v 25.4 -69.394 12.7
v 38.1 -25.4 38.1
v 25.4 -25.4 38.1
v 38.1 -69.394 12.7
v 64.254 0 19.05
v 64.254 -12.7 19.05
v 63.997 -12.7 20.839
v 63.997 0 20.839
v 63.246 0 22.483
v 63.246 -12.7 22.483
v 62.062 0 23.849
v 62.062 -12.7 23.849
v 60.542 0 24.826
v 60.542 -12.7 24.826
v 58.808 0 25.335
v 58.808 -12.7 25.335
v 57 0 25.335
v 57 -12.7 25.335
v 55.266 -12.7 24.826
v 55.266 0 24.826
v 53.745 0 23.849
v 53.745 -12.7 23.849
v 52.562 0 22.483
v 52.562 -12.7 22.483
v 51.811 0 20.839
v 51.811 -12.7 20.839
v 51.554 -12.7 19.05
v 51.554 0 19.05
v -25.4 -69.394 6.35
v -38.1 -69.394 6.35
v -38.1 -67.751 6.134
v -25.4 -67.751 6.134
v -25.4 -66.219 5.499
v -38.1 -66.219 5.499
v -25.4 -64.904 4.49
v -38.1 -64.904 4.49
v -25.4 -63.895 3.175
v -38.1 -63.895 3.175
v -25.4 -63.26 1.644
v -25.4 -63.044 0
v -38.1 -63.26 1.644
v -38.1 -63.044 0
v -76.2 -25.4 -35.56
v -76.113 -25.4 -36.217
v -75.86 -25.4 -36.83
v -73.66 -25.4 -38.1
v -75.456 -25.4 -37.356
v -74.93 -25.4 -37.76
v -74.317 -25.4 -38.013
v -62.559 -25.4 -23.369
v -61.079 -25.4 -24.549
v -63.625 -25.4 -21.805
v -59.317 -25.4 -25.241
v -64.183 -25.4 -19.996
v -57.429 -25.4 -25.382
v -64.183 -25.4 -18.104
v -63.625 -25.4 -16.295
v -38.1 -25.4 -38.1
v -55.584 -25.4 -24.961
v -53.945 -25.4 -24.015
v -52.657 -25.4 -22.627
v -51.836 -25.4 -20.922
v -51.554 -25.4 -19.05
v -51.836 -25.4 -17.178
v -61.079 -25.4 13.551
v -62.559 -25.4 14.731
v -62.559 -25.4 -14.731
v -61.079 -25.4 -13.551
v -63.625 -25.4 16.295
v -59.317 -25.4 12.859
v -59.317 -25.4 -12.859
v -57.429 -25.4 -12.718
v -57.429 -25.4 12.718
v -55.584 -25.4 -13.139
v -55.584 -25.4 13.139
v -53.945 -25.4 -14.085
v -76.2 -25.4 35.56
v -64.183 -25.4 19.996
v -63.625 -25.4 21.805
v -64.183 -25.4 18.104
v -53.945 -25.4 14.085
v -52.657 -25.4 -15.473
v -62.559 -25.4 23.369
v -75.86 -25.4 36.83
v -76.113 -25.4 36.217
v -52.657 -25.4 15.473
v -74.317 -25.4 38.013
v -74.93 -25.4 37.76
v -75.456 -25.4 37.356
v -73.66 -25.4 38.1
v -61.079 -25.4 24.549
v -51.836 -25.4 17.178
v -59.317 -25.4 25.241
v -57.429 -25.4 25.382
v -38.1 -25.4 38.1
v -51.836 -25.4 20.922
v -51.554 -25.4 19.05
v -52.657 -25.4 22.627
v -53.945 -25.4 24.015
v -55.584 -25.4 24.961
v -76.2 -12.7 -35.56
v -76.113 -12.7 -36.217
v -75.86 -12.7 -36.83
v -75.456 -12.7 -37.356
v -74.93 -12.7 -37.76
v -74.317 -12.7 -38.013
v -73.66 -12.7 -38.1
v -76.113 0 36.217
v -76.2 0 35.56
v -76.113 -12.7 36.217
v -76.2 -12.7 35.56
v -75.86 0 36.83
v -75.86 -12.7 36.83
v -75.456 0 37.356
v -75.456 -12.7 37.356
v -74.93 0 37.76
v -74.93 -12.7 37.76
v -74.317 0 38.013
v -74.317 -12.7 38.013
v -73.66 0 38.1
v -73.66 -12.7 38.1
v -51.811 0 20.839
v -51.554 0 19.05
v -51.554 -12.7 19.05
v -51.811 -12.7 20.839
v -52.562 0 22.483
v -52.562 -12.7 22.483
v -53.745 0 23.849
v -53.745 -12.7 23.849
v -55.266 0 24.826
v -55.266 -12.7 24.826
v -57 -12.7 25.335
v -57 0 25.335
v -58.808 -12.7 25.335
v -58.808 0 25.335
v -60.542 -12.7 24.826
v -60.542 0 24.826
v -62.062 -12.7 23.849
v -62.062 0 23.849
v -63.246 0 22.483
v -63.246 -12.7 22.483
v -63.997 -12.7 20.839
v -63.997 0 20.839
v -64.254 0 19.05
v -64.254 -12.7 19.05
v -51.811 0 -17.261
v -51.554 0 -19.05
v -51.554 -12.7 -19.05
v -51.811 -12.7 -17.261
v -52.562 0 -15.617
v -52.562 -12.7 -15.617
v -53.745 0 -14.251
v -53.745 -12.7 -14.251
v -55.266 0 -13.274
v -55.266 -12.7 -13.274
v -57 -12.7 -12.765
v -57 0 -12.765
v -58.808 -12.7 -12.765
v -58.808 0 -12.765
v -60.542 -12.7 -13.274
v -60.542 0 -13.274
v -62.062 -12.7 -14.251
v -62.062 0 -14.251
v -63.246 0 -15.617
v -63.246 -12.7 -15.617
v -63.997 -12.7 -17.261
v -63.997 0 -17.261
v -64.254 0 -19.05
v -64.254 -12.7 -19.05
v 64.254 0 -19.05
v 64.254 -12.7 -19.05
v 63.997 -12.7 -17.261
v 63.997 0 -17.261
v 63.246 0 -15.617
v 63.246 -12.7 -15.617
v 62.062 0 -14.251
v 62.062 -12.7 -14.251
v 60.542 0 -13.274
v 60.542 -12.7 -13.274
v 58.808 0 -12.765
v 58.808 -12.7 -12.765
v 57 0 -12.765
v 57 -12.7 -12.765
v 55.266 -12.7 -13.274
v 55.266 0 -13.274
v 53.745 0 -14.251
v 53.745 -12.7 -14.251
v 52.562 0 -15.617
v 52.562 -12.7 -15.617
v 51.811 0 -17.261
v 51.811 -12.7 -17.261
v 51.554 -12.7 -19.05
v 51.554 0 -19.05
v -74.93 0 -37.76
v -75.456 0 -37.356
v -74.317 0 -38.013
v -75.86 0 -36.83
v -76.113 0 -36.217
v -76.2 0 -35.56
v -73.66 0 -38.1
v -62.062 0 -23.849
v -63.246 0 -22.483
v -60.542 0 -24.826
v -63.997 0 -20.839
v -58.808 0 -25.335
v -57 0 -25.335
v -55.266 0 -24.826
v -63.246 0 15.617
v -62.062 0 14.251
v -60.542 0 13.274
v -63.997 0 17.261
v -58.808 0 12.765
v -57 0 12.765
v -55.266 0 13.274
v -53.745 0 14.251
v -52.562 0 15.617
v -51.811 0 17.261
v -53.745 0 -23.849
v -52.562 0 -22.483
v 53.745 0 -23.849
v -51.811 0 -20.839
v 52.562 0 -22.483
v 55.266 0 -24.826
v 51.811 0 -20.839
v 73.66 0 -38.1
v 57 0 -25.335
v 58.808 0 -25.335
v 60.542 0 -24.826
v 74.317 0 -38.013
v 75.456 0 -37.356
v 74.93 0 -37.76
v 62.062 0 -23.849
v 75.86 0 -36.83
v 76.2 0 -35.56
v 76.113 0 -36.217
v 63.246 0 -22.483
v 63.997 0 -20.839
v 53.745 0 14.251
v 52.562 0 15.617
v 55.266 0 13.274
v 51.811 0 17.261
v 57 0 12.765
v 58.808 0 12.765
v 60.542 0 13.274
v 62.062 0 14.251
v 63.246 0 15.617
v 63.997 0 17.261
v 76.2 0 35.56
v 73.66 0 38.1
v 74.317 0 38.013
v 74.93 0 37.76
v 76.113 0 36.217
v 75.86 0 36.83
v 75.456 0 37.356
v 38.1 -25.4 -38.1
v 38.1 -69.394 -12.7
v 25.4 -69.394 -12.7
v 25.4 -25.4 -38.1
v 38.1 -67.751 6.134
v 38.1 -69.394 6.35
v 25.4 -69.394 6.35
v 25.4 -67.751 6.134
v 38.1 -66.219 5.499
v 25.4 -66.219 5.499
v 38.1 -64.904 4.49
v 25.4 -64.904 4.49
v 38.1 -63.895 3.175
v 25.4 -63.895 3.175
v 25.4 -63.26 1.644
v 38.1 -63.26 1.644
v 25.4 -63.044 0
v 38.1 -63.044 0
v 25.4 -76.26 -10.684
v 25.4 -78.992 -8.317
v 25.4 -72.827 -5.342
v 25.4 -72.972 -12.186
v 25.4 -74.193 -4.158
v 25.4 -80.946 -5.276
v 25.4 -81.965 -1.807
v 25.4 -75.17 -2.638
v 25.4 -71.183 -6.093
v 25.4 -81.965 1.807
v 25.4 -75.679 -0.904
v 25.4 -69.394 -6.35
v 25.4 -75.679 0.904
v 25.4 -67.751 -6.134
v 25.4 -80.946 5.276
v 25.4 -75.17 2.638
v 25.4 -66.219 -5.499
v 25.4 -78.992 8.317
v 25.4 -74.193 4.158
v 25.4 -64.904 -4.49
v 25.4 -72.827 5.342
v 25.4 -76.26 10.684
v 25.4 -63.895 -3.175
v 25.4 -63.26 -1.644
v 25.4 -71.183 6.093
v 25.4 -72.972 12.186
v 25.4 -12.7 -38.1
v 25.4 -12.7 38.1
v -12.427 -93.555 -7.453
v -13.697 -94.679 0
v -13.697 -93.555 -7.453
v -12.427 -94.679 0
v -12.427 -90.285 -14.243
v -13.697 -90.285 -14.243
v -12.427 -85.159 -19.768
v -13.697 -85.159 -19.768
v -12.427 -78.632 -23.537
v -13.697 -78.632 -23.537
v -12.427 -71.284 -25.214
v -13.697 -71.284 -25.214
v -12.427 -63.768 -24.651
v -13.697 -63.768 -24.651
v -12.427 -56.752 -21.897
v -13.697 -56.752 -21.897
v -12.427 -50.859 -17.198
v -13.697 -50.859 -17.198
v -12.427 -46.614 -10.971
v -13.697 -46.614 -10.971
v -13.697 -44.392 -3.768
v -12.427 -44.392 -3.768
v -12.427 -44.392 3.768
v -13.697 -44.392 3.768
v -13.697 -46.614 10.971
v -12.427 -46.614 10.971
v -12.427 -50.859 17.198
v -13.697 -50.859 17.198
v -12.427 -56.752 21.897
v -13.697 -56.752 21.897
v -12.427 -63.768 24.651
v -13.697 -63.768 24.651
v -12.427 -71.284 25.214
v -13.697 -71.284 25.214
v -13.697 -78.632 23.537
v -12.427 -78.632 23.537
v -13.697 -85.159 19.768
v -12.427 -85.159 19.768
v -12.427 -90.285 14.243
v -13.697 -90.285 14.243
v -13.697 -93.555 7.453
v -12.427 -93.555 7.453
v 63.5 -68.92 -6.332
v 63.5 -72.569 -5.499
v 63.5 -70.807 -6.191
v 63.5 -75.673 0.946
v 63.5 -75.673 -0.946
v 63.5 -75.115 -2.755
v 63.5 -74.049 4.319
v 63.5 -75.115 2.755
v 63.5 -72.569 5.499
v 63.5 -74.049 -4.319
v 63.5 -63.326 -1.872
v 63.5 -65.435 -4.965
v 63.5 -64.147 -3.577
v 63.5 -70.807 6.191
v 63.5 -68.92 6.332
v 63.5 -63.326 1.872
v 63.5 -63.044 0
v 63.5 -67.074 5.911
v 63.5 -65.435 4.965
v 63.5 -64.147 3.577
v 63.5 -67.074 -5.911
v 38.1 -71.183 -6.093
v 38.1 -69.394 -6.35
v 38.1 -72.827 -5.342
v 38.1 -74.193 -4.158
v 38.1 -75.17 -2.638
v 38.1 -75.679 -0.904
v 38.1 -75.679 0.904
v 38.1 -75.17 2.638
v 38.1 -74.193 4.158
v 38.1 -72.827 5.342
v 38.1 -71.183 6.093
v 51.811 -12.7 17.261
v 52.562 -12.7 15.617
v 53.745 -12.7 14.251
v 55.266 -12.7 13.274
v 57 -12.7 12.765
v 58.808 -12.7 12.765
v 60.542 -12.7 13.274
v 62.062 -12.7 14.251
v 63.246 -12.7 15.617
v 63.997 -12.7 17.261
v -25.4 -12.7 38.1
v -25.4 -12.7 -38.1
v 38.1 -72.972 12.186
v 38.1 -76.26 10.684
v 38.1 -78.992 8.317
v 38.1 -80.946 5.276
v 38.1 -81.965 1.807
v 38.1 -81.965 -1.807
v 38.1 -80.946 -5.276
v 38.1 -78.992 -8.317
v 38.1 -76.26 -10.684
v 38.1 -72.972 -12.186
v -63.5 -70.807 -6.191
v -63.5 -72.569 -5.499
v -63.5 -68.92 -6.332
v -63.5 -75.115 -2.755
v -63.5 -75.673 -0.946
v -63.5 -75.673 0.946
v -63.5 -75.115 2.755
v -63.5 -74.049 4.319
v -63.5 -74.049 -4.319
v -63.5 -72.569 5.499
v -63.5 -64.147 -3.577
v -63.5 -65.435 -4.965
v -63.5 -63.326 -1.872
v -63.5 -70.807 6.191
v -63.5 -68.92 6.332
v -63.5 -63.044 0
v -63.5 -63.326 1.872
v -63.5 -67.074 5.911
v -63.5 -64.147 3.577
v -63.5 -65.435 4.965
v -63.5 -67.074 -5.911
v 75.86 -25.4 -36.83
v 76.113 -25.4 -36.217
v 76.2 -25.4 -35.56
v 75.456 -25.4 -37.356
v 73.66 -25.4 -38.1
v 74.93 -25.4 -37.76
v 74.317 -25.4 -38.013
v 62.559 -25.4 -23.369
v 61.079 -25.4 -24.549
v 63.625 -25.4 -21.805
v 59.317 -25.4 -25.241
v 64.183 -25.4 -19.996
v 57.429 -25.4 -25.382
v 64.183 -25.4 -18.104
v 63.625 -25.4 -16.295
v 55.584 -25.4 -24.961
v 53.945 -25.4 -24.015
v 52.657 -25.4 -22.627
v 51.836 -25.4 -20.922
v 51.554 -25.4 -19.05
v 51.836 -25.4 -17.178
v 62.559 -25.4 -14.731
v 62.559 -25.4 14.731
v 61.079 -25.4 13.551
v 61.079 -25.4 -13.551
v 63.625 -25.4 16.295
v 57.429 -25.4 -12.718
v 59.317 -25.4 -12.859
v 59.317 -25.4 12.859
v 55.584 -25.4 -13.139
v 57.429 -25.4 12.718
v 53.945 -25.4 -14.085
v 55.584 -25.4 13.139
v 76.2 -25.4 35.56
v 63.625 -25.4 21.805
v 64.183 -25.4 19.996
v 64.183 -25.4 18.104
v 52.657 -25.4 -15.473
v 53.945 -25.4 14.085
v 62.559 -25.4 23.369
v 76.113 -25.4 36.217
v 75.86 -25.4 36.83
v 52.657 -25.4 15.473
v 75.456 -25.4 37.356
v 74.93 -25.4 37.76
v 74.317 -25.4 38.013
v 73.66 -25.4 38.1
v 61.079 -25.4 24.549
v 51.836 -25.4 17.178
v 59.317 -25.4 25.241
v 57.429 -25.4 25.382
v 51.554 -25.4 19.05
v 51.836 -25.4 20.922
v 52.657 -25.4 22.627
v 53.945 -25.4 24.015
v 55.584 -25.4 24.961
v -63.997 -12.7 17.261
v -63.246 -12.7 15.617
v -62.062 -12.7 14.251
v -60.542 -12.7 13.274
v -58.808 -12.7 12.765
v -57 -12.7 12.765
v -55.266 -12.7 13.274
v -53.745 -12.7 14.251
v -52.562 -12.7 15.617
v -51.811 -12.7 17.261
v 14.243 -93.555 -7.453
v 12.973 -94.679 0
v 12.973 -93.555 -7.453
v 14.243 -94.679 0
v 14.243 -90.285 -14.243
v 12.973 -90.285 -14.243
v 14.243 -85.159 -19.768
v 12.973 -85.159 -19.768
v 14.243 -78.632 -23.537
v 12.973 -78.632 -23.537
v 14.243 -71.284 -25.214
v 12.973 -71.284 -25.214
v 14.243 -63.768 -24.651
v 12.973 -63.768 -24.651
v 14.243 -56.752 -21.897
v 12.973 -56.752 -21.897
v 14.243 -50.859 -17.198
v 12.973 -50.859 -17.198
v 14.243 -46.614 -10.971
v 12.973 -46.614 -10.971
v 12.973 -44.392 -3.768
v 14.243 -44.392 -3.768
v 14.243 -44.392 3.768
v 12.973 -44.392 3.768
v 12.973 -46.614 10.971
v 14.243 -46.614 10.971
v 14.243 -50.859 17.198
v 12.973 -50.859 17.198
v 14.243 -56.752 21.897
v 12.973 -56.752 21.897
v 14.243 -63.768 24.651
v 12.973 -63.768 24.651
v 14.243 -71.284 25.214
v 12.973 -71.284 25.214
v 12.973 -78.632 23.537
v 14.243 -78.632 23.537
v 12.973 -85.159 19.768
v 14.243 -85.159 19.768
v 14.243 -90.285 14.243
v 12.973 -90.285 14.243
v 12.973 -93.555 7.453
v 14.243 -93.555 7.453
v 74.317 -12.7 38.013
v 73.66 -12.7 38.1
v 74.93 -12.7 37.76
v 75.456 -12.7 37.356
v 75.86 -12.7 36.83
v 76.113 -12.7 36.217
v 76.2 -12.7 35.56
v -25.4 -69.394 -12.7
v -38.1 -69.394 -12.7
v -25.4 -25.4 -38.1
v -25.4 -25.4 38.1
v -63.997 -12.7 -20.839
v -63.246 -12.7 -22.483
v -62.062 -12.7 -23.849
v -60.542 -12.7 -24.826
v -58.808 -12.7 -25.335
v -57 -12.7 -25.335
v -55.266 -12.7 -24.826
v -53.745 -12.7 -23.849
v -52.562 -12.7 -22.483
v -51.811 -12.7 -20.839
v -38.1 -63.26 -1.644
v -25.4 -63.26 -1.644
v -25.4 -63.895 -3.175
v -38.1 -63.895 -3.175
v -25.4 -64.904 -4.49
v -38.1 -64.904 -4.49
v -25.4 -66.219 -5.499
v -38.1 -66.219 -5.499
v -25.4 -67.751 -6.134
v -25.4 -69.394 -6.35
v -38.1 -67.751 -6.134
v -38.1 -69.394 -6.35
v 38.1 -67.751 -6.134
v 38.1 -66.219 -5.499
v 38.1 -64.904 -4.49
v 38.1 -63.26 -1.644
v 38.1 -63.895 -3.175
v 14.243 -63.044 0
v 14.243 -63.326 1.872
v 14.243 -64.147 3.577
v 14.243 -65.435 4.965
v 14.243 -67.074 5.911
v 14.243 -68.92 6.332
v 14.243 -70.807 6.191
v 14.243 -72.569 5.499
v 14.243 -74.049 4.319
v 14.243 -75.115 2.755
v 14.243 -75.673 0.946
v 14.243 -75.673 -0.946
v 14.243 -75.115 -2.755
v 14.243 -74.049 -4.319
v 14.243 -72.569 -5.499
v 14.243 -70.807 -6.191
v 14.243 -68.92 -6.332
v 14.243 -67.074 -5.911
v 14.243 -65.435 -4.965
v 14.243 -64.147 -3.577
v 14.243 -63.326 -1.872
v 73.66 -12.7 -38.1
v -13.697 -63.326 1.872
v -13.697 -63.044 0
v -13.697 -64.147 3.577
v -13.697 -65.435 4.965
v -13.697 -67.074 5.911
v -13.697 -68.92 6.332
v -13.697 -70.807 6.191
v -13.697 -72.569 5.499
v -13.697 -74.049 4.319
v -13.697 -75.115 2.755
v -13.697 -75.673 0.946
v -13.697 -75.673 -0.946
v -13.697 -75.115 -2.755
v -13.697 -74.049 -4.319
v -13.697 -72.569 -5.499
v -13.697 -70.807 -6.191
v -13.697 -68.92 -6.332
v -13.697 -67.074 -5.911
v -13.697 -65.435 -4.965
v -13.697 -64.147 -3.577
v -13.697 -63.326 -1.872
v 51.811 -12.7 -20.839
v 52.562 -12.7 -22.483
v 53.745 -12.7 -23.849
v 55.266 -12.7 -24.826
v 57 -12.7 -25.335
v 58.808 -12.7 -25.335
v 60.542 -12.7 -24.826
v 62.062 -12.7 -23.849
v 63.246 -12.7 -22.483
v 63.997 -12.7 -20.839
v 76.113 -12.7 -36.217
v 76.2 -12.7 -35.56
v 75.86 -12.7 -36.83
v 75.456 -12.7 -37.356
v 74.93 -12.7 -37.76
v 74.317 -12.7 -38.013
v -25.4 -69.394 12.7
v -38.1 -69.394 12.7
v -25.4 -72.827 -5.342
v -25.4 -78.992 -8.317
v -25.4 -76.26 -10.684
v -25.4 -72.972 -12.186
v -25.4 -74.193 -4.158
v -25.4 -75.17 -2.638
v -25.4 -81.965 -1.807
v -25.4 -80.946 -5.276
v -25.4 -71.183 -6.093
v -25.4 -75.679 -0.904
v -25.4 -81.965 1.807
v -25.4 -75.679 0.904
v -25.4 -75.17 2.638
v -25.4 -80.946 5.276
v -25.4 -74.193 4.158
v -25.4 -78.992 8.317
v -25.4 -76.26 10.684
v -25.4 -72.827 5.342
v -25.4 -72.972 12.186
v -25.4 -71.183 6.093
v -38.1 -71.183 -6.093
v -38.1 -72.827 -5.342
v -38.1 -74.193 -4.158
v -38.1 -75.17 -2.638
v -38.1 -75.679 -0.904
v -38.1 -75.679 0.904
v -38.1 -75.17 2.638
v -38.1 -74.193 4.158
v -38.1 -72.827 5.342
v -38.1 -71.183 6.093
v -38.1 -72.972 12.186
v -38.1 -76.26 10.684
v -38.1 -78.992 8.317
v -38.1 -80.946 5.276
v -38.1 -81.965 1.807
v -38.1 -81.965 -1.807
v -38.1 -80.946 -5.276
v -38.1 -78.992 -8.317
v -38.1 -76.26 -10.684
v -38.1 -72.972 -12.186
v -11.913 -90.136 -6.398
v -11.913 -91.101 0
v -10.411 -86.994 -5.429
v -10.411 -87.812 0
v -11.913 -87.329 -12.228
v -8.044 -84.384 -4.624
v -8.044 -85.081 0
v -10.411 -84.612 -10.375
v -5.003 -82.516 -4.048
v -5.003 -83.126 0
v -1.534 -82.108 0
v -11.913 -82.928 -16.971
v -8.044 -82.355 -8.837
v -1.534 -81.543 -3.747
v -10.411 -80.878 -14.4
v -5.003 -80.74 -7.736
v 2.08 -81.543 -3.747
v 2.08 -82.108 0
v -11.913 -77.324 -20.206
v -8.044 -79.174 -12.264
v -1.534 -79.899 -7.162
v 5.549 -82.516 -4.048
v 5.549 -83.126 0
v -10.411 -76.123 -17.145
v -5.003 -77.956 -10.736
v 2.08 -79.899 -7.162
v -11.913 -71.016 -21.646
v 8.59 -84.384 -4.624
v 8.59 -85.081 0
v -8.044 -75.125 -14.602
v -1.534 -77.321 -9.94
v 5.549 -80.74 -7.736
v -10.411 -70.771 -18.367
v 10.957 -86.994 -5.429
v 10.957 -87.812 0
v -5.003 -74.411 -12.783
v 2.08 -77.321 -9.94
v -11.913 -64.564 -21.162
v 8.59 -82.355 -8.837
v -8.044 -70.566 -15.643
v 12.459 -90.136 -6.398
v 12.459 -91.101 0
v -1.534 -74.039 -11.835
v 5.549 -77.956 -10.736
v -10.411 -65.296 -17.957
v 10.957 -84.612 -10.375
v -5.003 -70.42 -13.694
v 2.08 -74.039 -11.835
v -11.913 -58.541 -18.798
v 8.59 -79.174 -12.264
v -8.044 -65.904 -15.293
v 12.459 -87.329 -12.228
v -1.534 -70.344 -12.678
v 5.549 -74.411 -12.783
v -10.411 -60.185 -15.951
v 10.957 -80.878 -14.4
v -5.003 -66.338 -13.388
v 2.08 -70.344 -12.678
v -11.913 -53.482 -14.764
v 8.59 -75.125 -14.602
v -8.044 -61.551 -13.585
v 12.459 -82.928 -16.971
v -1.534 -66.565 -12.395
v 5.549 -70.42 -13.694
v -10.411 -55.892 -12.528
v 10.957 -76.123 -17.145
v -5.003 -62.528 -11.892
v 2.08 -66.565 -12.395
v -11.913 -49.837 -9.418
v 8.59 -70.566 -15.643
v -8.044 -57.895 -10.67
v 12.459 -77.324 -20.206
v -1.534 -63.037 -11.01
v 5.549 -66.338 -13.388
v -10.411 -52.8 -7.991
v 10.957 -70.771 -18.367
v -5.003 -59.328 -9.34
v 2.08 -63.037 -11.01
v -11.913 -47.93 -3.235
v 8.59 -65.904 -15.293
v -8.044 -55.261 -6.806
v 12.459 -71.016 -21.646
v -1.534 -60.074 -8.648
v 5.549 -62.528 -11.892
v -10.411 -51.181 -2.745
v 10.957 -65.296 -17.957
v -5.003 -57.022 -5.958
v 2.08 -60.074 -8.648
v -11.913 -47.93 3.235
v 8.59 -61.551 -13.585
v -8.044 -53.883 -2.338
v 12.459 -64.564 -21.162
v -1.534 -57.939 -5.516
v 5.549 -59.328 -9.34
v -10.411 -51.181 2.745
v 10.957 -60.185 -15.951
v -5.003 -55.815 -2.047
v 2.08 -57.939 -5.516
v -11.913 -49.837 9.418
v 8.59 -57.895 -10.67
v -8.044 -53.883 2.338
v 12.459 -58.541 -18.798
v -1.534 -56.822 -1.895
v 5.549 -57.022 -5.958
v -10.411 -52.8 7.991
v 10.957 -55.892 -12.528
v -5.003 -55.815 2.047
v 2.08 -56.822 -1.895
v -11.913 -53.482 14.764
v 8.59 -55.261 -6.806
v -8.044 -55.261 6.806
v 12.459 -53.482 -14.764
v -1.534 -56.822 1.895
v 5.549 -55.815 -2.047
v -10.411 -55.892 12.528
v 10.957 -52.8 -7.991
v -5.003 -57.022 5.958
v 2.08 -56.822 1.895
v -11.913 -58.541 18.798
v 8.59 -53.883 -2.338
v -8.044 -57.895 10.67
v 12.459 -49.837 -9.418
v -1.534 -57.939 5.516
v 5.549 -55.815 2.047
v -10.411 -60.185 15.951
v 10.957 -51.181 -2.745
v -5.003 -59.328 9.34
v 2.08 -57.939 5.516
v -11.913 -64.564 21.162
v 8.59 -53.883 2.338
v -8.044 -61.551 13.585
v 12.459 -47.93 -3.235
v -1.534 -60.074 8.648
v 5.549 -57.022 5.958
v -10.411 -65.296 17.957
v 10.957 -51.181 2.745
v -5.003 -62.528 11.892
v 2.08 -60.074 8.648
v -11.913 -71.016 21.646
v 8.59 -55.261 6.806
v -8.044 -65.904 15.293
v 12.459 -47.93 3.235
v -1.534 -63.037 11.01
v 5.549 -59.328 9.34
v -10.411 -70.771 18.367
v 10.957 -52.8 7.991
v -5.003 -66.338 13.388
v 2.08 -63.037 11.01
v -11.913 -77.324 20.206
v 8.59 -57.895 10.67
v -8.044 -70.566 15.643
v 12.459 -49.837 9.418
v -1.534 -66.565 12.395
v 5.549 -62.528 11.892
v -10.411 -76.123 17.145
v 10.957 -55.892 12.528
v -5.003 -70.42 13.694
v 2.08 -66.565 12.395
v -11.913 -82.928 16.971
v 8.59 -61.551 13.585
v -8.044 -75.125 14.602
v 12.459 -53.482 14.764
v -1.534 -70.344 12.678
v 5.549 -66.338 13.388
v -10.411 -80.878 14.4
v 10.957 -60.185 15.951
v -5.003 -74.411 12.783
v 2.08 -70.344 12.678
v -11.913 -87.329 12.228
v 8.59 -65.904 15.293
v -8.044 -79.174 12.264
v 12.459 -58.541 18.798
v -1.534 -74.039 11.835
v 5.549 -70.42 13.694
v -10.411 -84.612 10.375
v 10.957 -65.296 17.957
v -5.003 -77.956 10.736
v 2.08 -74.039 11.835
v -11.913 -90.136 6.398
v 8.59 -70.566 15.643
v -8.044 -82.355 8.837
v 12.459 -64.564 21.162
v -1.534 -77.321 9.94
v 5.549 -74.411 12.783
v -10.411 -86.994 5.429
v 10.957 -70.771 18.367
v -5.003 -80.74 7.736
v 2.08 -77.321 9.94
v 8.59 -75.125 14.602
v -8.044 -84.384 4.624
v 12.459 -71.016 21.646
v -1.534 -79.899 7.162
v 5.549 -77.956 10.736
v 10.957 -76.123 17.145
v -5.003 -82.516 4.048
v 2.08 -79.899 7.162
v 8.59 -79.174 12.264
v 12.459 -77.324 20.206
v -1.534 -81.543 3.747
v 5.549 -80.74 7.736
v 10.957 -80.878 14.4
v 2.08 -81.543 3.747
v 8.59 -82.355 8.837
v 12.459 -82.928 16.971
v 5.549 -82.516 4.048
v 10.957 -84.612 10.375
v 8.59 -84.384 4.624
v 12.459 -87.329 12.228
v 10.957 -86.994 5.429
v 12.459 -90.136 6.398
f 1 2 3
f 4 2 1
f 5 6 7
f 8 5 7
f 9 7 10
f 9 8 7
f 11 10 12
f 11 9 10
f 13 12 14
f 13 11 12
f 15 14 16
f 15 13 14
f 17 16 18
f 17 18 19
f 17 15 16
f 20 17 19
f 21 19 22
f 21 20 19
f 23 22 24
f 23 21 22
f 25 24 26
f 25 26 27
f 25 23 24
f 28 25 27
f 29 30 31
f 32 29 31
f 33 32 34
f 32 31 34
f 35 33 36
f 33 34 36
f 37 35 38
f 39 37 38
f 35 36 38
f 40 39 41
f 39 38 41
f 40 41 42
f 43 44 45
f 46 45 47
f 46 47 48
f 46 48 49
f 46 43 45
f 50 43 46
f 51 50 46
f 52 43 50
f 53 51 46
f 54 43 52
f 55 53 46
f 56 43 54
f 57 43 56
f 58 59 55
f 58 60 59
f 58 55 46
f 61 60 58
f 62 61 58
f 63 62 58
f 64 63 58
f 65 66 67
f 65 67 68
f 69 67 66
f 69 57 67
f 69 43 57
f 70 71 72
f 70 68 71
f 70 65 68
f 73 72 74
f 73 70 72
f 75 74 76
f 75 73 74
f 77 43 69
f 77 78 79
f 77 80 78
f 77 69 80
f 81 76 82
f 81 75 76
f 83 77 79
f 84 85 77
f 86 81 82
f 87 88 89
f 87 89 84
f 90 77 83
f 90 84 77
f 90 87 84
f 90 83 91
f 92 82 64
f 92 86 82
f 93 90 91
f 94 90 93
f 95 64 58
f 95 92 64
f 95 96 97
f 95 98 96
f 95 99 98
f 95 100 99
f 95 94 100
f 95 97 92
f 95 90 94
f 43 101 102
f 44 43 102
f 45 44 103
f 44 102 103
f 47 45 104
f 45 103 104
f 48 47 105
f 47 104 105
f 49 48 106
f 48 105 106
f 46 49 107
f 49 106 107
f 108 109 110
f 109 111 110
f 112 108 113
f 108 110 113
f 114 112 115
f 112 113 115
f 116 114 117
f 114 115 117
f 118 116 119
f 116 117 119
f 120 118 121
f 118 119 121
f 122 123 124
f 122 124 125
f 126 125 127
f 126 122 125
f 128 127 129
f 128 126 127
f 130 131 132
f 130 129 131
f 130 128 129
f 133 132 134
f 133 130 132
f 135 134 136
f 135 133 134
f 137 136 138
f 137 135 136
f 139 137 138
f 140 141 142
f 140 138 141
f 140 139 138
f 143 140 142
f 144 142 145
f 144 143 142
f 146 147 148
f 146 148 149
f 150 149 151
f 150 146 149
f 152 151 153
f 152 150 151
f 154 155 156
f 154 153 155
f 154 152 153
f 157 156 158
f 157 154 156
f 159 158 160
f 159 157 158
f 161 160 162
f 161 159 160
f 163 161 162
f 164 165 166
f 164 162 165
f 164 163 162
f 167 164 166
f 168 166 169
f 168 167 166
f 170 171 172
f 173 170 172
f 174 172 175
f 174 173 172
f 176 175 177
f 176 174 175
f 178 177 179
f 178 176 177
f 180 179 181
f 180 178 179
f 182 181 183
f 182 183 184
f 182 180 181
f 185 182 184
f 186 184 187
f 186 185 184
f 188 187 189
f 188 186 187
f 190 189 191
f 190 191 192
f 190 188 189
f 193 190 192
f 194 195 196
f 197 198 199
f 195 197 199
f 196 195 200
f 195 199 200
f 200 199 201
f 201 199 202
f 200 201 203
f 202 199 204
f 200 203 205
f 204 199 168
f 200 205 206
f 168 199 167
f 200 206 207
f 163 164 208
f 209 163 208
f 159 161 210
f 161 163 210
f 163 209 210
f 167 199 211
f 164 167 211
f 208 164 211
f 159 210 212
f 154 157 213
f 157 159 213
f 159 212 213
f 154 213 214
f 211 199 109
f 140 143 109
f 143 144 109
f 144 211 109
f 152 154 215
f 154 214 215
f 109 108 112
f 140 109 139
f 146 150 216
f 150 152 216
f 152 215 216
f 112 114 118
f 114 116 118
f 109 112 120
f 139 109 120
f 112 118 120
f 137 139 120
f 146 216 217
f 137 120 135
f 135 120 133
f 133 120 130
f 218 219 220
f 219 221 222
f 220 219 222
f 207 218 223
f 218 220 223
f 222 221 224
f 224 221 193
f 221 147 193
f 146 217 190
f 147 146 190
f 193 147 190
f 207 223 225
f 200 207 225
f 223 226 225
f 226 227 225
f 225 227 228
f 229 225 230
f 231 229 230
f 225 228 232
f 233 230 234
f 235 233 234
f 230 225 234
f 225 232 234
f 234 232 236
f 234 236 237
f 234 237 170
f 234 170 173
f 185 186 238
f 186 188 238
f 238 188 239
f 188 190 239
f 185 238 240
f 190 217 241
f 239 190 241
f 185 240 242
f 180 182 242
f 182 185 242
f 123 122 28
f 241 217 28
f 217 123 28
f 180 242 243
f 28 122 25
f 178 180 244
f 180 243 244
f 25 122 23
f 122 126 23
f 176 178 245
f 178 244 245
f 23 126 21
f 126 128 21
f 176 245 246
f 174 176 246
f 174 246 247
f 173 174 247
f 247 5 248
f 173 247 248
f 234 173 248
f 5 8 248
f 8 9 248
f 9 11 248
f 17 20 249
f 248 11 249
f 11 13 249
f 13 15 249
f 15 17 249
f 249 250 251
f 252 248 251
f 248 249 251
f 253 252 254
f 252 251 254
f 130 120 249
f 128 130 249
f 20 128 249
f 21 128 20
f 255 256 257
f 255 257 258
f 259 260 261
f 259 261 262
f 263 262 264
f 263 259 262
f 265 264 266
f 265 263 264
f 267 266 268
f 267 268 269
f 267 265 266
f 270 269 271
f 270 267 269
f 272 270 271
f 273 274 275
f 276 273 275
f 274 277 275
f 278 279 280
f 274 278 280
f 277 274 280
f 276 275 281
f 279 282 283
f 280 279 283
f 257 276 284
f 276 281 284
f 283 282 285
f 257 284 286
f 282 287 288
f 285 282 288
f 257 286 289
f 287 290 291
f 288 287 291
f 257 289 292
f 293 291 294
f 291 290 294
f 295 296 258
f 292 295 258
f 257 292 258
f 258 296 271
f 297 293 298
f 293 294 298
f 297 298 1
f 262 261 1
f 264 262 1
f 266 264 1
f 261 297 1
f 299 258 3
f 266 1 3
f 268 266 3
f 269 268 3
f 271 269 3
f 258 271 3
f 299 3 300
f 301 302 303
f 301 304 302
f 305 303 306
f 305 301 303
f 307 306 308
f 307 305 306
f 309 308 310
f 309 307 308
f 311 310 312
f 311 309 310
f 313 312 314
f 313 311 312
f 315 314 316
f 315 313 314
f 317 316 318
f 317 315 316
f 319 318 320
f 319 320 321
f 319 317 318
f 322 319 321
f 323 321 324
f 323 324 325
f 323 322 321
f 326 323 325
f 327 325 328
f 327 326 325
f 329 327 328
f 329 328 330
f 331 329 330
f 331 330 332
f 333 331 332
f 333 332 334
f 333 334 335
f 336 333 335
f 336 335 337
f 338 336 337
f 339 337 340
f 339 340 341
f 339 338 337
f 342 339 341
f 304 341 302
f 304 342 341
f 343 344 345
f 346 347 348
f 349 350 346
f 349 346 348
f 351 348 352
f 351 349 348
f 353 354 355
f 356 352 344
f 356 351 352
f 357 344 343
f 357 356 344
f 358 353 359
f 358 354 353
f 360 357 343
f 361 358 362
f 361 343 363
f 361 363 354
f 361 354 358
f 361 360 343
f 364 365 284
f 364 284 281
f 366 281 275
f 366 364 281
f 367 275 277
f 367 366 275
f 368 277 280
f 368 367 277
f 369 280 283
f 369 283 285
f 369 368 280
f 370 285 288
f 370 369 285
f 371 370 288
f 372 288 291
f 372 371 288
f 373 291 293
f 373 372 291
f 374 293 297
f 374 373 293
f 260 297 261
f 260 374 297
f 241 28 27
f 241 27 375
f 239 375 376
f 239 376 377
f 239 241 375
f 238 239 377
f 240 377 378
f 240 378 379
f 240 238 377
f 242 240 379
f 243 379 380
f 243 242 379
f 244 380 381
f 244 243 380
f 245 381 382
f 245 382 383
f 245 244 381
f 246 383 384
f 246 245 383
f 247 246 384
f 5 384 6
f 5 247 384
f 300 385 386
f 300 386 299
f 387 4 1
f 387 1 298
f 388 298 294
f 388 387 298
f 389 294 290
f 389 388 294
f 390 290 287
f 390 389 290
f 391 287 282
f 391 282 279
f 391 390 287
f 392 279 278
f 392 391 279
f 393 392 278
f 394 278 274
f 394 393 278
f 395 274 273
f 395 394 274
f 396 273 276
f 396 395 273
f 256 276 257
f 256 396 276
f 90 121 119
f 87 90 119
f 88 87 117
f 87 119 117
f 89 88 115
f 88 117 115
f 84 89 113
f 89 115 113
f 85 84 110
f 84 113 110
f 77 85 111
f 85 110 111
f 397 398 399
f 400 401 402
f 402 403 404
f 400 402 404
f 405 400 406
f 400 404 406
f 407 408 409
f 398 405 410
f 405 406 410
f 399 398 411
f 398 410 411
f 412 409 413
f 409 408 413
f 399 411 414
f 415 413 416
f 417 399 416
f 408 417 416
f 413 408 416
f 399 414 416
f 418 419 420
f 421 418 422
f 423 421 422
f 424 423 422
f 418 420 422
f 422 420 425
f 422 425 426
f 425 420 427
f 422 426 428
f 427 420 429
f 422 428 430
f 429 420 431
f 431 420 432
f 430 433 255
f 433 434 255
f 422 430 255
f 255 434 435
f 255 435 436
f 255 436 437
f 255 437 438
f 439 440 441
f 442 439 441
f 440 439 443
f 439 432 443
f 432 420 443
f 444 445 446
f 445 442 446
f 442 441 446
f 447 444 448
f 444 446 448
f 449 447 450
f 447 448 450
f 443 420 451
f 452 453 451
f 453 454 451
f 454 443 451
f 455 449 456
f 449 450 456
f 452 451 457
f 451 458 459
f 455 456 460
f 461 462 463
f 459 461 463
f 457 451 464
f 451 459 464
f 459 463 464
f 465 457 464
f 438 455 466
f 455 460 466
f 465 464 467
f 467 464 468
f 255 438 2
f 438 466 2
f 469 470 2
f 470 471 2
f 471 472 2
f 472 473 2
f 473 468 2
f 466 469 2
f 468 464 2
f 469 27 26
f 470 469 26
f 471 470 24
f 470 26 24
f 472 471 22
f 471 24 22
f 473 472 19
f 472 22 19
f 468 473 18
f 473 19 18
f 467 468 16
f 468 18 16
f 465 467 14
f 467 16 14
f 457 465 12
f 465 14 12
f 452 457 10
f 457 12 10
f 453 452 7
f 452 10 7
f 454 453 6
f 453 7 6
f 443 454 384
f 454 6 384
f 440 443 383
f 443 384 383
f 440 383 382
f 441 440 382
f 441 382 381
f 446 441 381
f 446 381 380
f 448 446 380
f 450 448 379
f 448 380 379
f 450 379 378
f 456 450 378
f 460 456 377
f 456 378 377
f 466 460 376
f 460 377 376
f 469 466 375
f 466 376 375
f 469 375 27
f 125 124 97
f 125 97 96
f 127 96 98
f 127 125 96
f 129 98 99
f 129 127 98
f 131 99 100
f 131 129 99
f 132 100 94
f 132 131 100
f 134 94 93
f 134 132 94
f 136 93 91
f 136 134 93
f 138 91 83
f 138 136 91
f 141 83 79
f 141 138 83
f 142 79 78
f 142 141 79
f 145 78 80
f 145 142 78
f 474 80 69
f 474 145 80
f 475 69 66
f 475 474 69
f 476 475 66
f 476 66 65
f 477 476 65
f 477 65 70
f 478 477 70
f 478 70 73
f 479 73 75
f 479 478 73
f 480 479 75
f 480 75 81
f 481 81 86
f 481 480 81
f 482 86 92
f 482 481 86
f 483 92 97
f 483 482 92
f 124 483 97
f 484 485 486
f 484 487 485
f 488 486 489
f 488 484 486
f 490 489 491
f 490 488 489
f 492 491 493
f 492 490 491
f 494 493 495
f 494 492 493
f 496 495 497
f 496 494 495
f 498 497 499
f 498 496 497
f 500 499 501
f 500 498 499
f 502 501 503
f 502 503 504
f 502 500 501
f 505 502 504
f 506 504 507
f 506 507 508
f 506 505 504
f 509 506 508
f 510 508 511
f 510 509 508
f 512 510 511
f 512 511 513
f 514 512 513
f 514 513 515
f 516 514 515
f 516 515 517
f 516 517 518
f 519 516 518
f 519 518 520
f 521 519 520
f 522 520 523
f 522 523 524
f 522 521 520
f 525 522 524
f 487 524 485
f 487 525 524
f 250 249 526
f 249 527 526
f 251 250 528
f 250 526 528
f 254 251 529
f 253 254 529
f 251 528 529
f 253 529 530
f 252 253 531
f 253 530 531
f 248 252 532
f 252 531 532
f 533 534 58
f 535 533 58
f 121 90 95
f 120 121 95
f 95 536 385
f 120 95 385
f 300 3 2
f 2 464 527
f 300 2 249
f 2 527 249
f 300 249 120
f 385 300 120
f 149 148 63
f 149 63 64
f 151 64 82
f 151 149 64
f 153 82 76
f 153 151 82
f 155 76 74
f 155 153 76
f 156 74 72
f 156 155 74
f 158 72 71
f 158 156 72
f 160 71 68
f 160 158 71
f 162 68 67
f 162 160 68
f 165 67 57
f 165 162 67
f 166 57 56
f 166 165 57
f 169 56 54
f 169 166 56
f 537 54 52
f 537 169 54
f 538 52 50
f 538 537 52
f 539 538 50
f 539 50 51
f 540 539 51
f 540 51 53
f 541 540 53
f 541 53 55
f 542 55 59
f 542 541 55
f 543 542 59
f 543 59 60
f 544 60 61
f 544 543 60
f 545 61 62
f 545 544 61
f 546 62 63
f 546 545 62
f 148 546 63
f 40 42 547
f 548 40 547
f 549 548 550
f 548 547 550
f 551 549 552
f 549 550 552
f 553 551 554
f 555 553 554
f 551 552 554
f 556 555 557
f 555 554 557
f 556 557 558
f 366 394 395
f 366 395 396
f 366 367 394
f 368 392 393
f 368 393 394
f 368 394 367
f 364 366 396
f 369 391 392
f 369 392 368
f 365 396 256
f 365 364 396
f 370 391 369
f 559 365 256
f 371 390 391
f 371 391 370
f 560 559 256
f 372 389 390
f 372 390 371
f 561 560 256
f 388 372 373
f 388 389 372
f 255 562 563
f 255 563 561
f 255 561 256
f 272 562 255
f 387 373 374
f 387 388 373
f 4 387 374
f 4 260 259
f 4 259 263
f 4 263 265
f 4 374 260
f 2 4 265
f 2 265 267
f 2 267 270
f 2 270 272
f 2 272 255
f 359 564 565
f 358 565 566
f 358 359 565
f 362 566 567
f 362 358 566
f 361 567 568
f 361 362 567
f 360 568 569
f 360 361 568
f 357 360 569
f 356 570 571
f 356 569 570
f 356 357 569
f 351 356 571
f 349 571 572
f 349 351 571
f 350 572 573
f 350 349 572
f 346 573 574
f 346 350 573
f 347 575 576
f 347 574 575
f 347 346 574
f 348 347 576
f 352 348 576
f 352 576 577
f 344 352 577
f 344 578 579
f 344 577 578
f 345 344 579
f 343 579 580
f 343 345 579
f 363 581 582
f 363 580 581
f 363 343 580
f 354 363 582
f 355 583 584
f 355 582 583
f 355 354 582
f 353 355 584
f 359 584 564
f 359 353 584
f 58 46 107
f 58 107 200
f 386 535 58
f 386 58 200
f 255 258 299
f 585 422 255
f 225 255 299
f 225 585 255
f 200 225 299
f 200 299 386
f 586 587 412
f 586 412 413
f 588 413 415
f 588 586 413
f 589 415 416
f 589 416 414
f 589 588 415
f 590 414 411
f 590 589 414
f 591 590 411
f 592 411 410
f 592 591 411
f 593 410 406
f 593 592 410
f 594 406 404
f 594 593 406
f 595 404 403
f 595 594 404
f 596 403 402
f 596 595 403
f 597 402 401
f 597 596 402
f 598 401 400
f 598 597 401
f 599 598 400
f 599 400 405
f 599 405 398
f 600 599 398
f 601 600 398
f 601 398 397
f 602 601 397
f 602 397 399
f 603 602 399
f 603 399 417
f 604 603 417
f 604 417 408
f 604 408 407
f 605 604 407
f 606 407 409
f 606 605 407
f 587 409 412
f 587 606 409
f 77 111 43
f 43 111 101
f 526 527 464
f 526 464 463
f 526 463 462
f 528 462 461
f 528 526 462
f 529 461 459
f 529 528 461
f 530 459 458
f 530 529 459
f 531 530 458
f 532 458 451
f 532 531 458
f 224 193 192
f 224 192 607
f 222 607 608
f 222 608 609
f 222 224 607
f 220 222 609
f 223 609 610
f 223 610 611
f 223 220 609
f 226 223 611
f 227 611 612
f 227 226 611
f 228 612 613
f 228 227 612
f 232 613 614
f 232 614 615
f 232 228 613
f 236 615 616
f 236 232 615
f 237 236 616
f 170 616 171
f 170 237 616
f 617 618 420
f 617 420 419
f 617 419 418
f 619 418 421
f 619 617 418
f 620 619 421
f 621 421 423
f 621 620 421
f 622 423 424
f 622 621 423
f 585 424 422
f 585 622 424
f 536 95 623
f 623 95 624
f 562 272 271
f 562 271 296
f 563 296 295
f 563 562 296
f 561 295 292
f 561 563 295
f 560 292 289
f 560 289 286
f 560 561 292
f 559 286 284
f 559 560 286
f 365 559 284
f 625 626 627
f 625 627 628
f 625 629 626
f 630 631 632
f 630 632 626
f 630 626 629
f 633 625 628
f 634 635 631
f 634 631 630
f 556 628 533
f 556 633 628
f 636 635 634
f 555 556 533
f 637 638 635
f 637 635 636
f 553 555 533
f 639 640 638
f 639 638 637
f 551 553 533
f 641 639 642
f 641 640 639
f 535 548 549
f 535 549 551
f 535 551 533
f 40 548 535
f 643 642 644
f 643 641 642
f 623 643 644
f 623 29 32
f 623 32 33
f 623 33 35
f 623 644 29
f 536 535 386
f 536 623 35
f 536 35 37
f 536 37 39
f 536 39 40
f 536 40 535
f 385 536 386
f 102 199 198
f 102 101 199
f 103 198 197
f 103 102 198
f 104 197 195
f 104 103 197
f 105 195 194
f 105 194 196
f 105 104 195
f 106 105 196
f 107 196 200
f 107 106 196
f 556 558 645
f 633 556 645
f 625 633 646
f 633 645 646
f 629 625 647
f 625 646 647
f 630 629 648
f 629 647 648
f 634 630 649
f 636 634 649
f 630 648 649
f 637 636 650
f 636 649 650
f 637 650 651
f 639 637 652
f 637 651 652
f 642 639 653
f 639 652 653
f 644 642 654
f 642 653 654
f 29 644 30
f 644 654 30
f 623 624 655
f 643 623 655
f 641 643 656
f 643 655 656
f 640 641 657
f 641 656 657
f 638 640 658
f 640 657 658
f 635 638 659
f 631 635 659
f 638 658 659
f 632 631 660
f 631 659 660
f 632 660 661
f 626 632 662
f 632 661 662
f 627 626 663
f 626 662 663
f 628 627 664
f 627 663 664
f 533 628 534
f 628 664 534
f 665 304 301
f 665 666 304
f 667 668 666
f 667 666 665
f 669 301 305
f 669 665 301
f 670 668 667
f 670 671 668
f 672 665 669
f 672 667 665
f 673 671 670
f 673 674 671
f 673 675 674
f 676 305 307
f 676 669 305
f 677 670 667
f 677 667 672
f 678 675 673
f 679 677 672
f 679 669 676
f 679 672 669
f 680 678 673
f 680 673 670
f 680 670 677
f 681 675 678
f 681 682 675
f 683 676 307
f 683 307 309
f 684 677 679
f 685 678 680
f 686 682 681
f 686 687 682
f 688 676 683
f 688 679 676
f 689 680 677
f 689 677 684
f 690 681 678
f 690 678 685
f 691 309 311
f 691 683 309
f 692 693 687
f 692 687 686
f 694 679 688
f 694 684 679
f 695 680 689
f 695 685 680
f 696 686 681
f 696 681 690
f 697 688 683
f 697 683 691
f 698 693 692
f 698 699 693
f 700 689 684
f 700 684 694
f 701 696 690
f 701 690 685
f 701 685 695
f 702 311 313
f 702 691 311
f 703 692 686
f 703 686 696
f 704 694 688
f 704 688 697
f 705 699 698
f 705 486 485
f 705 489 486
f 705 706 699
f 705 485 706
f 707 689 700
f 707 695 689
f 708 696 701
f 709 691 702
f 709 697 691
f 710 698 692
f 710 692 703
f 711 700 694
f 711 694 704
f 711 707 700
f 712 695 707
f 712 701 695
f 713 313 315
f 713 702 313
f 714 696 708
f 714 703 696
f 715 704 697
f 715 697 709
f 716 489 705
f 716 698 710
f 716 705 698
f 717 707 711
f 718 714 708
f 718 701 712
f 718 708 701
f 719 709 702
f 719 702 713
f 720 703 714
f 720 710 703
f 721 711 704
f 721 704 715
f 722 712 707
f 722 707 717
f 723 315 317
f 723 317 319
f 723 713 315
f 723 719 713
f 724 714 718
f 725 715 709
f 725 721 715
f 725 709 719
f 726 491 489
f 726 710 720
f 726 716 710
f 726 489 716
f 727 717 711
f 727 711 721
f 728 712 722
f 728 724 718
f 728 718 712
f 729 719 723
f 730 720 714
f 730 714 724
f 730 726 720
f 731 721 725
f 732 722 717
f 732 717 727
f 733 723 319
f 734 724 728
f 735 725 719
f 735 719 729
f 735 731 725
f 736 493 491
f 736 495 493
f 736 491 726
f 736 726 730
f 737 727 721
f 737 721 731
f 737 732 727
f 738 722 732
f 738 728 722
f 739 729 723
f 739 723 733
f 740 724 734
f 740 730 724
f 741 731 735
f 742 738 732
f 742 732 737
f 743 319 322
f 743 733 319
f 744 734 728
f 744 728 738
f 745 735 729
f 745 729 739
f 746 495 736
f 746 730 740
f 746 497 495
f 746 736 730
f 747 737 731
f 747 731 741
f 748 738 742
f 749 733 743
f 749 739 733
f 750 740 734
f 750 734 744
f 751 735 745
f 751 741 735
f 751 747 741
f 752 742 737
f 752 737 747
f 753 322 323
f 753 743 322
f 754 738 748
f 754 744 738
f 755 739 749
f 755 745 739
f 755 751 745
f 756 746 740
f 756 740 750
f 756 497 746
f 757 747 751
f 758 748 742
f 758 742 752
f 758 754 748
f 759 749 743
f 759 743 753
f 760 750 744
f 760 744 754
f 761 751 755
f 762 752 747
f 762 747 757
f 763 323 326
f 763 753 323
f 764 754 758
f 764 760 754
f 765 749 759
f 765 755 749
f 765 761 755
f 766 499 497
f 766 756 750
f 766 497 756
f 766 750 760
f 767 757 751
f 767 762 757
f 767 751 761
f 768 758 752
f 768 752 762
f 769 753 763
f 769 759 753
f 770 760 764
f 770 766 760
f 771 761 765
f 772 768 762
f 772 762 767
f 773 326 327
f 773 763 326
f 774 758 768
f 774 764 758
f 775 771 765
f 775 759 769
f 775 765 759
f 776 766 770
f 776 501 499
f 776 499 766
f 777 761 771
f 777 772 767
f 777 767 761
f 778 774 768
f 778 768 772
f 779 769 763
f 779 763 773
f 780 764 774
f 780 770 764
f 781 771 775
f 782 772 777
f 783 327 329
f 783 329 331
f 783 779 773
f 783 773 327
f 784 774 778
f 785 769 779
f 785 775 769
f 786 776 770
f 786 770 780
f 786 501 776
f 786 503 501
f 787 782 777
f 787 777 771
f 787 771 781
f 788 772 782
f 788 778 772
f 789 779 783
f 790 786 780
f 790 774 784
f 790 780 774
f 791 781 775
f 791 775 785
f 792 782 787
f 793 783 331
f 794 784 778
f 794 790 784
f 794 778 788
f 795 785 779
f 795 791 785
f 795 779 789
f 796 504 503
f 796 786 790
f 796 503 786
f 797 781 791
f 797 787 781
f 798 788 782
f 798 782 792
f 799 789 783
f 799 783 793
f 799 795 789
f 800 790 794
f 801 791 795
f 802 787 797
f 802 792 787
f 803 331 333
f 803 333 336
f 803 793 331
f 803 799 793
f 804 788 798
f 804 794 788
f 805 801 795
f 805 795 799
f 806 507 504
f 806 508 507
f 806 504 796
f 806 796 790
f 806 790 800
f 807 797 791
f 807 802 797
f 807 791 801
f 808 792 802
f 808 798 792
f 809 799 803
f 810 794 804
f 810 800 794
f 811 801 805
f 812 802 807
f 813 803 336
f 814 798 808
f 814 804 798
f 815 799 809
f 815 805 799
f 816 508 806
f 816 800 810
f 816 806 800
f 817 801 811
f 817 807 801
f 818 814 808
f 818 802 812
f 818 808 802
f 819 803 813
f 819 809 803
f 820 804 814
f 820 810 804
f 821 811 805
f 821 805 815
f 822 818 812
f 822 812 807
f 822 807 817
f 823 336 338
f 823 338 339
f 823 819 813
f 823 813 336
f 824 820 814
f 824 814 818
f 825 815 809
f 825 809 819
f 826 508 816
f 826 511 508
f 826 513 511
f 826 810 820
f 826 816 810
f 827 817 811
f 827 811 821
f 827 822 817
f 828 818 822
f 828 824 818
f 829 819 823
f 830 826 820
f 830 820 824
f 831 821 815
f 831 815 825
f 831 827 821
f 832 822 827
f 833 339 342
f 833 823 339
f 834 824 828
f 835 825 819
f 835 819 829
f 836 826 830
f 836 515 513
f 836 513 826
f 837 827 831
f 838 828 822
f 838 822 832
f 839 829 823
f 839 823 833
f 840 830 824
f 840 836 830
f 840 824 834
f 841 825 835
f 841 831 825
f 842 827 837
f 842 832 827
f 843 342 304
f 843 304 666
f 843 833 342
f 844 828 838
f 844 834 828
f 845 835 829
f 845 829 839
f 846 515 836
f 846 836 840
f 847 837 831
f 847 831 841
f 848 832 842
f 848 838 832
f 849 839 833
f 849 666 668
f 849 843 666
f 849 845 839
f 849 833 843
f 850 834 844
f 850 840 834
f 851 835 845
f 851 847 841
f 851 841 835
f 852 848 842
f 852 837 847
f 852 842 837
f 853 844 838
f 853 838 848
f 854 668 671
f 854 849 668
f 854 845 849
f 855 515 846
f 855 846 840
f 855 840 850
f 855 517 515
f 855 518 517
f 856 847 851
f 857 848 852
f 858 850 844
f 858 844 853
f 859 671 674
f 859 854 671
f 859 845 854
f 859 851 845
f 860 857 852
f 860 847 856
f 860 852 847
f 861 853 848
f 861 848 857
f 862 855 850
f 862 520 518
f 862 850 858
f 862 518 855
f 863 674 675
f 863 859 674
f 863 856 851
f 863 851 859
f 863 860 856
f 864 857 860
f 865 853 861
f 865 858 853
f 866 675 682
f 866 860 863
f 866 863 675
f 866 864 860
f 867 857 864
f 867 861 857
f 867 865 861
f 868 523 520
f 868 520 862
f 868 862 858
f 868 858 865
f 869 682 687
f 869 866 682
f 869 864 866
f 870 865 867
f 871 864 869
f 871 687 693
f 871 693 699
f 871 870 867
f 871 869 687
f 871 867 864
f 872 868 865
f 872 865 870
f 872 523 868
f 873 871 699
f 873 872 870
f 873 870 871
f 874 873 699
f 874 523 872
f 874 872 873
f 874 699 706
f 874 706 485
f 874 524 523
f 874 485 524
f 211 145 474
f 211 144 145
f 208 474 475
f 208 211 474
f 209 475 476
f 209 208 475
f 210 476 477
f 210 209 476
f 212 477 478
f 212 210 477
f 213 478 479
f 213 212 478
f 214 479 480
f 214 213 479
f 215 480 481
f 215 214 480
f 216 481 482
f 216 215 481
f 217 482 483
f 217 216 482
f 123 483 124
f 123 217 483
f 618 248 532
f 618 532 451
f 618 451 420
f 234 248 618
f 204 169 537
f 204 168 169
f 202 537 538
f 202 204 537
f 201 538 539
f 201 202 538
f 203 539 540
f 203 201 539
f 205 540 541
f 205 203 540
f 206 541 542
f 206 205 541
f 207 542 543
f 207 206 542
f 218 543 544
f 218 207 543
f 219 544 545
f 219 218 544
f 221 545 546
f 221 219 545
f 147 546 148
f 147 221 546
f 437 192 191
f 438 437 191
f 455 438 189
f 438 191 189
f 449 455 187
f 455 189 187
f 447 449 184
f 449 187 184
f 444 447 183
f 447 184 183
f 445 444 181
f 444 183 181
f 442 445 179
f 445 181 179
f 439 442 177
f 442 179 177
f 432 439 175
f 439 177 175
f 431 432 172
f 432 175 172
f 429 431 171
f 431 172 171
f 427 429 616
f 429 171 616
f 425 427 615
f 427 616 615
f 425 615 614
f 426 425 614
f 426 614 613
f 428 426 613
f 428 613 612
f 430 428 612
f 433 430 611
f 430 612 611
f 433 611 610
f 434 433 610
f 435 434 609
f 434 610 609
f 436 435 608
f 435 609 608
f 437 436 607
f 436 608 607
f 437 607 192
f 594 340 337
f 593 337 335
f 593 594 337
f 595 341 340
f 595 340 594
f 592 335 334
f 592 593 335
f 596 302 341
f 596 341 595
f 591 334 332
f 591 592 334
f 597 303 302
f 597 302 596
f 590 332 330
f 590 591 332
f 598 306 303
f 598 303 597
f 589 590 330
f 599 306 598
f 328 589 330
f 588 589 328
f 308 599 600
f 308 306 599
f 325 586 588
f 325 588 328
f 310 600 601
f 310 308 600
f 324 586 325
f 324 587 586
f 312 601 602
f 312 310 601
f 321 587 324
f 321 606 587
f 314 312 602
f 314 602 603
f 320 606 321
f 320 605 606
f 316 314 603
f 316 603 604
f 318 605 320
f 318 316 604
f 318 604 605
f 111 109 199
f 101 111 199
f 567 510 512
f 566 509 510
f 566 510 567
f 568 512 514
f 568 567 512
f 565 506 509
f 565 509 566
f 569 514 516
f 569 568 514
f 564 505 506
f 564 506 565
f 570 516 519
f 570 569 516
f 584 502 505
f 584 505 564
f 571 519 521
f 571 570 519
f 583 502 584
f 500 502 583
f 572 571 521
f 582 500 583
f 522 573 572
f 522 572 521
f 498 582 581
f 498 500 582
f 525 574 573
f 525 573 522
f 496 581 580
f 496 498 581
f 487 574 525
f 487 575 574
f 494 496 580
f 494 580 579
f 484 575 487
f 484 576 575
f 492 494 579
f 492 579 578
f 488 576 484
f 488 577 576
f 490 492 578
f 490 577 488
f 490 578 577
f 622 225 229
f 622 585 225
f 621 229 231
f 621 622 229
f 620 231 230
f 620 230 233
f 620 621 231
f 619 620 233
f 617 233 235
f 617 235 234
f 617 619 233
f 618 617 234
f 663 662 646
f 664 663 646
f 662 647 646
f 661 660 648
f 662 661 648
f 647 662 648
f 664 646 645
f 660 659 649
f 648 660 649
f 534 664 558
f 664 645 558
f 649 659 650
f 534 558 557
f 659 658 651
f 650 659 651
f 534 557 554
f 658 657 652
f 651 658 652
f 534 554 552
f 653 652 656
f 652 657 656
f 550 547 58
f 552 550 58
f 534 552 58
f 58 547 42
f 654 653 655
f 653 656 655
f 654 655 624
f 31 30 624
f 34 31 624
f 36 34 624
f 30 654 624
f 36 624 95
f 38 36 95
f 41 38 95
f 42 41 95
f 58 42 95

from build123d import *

# Parameters (mm, degrees)
F0_W          = 152.4
F0_H          = 76.2
F0_R          = 6.35
F1_DEPTH      = 12.7
F2_R          = 2.54
F3_R          = 6.35
F4_DEPTH      = 12.7
F5_W          = 12.7
F5_H          = 76.2
F6_DEPTH      = 12.7
F8_R          = 6.35
F9_DEPTH      = 25.4
F9_DEPTH_BACK = 101.6


with BuildPart() as f1:
    # F0 (on Front) → F1 (new body)
    with BuildSketch(Plane.XZ):
        Rectangle(F0_W, F0_H)
        with Locations((-57.903849, -19.05)):
            Circle(F0_R, mode=Mode.SUBTRACT)
        with Locations((57.903849, -19.05)):
            Circle(F0_R, mode=Mode.SUBTRACT)
        with Locations((-57.903849, 19.05)):
            Circle(F0_R, mode=Mode.SUBTRACT)
        with Locations((57.903849, 19.05)):
            Circle(F0_R, mode=Mode.SUBTRACT)
    extrude(amount=F1_DEPTH)

    # F2
    f2_edges = [f1.edges().sort_by_distance(p)[0] for p in [
        (-76.2, -6.35, 38.1),
        (76.2, -6.35, 38.1),
        (-76.2, -6.35, -38.1),
        (76.2, -6.35, -38.1),
    ]]
    fillet(f2_edges, radius=F2_R)



with BuildPart() as f4:
    # F3 (on face) → F4 (new body)
    with BuildSketch(Plane.XZ.offset(12.7)):
        with BuildLine():
            Line((-38.1, -38.1), (-38.1, 38.1))
            Line((-38.1, 38.1), (-73.66, 38.1))
            ThreePointArc((-73.66, 38.1), (-75.456051, 37.356051), (-76.2, 35.56))
            Line((-76.2, 35.56), (-76.2, -35.56))
            ThreePointArc((-76.2, -35.56), (-75.456051, -37.356051), (-73.66, -38.1))
            Line((-73.66, -38.1), (-38.1, -38.1))
        make_face()
        with Locations((-57.903849, -19.05)):
            Circle(F3_R, mode=Mode.SUBTRACT)
        with Locations((-57.903849, 19.05)):
            Circle(F3_R, mode=Mode.SUBTRACT)
    extrude(amount=F4_DEPTH)


with BuildPart() as f1_1:
    add(f1.part)

    add(f4.part)  # F6 merges F4
    # F5 (on face) → F6 (join)
    with BuildSketch(Plane.YZ.offset(-38.1)):
        with BuildLine():
            Line((-69.394091, -12.7), (-25.4, -38.1))
            Line((-25.4, -38.1), (-25.4, 38.1))
            Line((-25.4, 38.1), (-69.394091, 12.7))
            ThreePointArc((-69.394091, 12.7), (-60.413834, 8.980256), (-56.694091, 0))
            ThreePointArc((-56.694091, 0), (-60.413834, -8.980256), (-69.394091, -12.7))
        make_face()
        with Locations((-19.05, 0)):
            Rectangle(F5_W, F5_H)
        with BuildLine():
            Line((-69.394091, -6.35), (-69.394091, -12.7))
            ThreePointArc((-69.394091, -12.7), (-60.413834, -8.980256), (-56.694091, 0))
            ThreePointArc((-56.694091, 0), (-60.413834, 8.980256), (-69.394091, 12.7))
            Line((-69.394091, 12.7), (-69.394091, 6.35))
            ThreePointArc((-69.394091, 6.35), (-64.903962, 4.490128), (-63.044091, 0))
            ThreePointArc((-63.044091, 0), (-64.903962, -4.490128), (-69.394091, -6.35))
        make_face()
        with BuildLine():
            ThreePointArc((-69.394091, 12.7), (-82.094091, 0), (-69.394091, -12.7))
            Line((-69.394091, -12.7), (-69.394091, -6.35))
            ThreePointArc((-69.394091, -6.35), (-75.744091, 0), (-69.394091, 6.35))
            Line((-69.394091, 6.35), (-69.394091, 12.7))
        make_face()
    extrude(amount=F6_DEPTH)

    # F7: F1 across plane


with BuildPart() as f1_2:
    add(f1_1.part)
    add(f1_1.part.mirror(Plane.YZ))


with BuildPart() as f9:
    # F8 (on face) → F9 (new body, two sides)
    with BuildSketch(Plane.YZ.offset(38.1)) as f9_sk:
        with Locations((-69.394091, 0)):
            Circle(F8_R)
    extrude(amount=F9_DEPTH)
    extrude(f9_sk.sketch, amount=-F9_DEPTH_BACK)

    # F10 (on Top) → F11 (revolve)
    with BuildSketch(Plane.XY):
        with BuildLine():
            Line((-13.697059, -75.744091), (-13.697059, -94.678637))
            Line((-13.697059, -94.678637), (-12.427059, -94.678637))
            ThreePointArc((-12.427059, -94.678637), (0.272941, -81.978637), (12.972941, -94.678637))
            Line((12.972941, -94.678637), (14.242941, -94.678637))
            Line((14.242941, -94.678637), (14.242941, -75.744091))
            Line((14.242941, -75.744091), (-13.697059, -75.744091))
        make_face()
    revolve(axis=Axis((38.1, -69.394091, 0), (1, 0, 0)))


solid = Compound([f1_2.part, f9.part])
